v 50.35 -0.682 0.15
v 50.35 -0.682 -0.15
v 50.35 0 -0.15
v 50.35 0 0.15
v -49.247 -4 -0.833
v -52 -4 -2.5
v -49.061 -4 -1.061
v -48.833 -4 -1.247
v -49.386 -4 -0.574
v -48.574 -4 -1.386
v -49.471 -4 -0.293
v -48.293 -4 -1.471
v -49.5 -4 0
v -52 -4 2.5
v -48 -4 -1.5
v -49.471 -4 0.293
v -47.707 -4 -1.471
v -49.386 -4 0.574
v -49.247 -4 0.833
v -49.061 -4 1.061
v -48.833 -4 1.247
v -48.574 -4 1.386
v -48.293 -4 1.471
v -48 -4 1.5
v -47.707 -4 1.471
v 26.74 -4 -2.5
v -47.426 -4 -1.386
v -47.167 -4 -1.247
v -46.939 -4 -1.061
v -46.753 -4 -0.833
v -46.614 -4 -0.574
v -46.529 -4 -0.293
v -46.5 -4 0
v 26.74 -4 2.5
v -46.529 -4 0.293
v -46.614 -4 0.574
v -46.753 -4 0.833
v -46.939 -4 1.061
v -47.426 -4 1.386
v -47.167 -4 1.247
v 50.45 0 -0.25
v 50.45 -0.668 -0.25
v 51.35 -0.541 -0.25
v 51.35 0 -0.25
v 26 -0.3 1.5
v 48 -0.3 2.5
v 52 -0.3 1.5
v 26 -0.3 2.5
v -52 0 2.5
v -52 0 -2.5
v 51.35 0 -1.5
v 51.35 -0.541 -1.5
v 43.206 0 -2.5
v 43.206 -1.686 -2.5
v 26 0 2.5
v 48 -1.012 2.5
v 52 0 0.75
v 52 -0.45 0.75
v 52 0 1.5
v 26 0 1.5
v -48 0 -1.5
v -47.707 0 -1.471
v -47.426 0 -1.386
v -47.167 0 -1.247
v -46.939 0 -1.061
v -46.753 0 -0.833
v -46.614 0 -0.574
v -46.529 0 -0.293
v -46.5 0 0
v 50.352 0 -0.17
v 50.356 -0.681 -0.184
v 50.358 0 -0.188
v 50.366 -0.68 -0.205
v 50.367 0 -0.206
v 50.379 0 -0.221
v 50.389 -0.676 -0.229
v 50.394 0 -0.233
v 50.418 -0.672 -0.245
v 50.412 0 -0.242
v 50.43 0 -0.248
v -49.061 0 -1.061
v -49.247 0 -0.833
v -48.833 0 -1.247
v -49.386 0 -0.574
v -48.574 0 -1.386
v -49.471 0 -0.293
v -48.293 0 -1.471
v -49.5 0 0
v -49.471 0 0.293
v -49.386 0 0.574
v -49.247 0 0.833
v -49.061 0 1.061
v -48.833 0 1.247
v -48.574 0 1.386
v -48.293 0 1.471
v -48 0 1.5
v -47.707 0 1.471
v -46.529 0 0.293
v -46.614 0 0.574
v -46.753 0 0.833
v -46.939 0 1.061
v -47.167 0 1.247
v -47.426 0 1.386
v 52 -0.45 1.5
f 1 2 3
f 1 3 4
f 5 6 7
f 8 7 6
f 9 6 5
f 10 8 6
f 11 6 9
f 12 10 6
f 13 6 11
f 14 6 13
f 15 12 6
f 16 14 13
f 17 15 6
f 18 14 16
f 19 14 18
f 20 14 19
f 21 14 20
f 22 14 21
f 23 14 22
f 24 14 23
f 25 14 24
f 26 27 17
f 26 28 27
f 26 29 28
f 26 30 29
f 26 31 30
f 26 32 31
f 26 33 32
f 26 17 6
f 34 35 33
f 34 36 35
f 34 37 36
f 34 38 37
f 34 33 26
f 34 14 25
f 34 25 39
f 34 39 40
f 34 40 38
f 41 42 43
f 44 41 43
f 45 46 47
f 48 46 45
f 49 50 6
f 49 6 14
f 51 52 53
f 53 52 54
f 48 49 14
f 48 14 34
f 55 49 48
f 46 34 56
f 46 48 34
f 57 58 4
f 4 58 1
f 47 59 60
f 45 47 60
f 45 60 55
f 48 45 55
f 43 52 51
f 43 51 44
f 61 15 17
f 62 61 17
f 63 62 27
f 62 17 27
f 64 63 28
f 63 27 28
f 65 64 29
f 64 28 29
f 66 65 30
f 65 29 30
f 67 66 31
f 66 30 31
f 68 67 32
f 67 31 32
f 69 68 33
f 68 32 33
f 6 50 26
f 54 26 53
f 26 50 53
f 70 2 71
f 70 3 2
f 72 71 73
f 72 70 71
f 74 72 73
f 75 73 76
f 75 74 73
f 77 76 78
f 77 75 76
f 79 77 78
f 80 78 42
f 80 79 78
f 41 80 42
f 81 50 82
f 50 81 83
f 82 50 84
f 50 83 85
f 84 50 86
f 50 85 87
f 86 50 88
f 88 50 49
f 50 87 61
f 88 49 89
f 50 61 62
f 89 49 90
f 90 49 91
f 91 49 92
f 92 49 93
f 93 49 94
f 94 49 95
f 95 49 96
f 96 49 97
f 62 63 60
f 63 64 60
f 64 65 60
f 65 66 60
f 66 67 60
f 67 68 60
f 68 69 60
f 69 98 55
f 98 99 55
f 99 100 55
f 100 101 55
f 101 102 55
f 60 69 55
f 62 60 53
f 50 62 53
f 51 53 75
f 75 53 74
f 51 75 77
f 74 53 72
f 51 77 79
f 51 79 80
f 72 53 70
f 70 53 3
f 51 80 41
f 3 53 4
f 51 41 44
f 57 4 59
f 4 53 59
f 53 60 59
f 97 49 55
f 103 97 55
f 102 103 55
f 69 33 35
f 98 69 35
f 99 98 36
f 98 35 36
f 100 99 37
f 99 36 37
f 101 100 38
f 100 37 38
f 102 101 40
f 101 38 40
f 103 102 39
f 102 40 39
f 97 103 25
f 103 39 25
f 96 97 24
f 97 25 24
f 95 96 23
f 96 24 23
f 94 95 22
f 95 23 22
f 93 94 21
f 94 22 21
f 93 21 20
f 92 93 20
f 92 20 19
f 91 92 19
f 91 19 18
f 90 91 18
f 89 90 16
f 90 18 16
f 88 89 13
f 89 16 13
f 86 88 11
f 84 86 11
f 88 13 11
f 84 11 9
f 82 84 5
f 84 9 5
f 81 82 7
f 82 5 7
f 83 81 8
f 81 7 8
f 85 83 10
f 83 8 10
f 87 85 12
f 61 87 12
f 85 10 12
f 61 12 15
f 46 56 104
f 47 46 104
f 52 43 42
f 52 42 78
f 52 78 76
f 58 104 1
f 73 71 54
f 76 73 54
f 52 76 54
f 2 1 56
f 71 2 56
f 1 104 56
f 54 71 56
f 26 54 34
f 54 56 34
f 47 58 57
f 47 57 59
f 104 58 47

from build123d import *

# Parameters (mm, degrees)
F0_W      = 104
F0_H      = 5
F1_DEPTH  = 4
F3_DEPTH  = 4
F4_W      = 0.65
F4_H      = 3.25
F5_DEPTH  = 4
F7_DEPTH  = 4
F8_W      = 1
F8_H      = 0.4
F9_DEPTH  = 4
F10_W     = 0.65
F10_H     = 0.6
F11_DEPTH = 4
F13_DEPTH = 4
F15_DEPTH = 4
F17_DEPTH = 5.001
F18_R     = 0.1
F20_DEPTH = 0.3


with BuildPart() as f1:
    # F0 (on Front) → F1 (new body)
    with BuildSketch(Plane.XZ):
        Rectangle(F0_W, F0_H)
    extrude(amount=F1_DEPTH)

    # F2 (on face) → F3 (cut, through all)
    with BuildSketch(Plane.XZ.offset(4)):
        with BuildLine():
            ThreePointArc((-48, -1.5), (-46.9393398282, -1.0606601718), (-46.5, 0))
            ThreePointArc((-46.5, 0), (-49.0606601718, 1.0606601718), (-48, -1.5))
        make_face()
    extrude(amount=-F3_DEPTH, mode=Mode.SUBTRACT)

    # F4 (on face) → F5 (cut, through all)
    with BuildSketch(Plane.XZ.offset(4)):
        with Locations((51.675, -0.875)):
            Rectangle(F4_W, F4_H)
    extrude(amount=-F5_DEPTH, mode=Mode.SUBTRACT)

    # F6 (on face) → F7 (cut, through all)
    with BuildSketch(Plane.XZ.offset(4)):
        Polygon((43.205653572, -2.5), (51.35, -2.5), (51.35, -1.5), align=None)
    extrude(amount=-F7_DEPTH, mode=Mode.SUBTRACT)

    # F8 (on face) → F9 (cut, through all)
    with BuildSketch(Plane.XZ.offset(4)):
        with Locations((50.85, -0.05)):
            Rectangle(F8_W, F8_H)
    extrude(amount=-F9_DEPTH, mode=Mode.SUBTRACT)

    # F10 (on face) → F11 (join)
    with BuildSketch(Plane.XZ.offset(4)):
        with Locations((51.675, 0.45)):
            Rectangle(F10_W, F10_H)
    extrude(amount=-F11_DEPTH)

    # F12 (on face) → F13 (cut, through all)
    with BuildSketch(Plane.XZ.offset(4)):
        Polygon((52, 0.15), (52, 0.75), (50.35, 0.15), align=None)
    extrude(amount=-F13_DEPTH, mode=Mode.SUBTRACT)

    # F14 (on face) → F15 (cut, through all)
    with BuildSketch(Plane.XZ.offset(4)):
        Polygon((52, 1.5), (52, 2.5), (48, 2.5), align=None)
    extrude(amount=-F15_DEPTH, mode=Mode.SUBTRACT)

    # F16 (on face) → F17 (cut, through all)
    with BuildSketch(Plane.XY.offset(2.5)):
        Polygon((52, -4), (52, -0.45), (26.7404374855, -4), align=None)
    extrude(amount=-F17_DEPTH, mode=Mode.SUBTRACT)

    # F18
    f18_edges = [f1.edges().sort_by_distance(p)[0] for p in [
        (50.35, -0.340946, -0.25),
    ]]
    fillet(f18_edges, radius=F18_R)

    # F19 (on face) → F20 (cut)
    with BuildSketch(Plane(origin=(0, 0, 0), x_dir=(-1, 0, 0), z_dir=(0, 1, 0))):
        Polygon((-48, 2.5), (-52, 1.5), (-26, 1.5), (-26, 2.5), align=None)
    extrude(amount=-F20_DEPTH, mode=Mode.SUBTRACT)


solid = f1.part
